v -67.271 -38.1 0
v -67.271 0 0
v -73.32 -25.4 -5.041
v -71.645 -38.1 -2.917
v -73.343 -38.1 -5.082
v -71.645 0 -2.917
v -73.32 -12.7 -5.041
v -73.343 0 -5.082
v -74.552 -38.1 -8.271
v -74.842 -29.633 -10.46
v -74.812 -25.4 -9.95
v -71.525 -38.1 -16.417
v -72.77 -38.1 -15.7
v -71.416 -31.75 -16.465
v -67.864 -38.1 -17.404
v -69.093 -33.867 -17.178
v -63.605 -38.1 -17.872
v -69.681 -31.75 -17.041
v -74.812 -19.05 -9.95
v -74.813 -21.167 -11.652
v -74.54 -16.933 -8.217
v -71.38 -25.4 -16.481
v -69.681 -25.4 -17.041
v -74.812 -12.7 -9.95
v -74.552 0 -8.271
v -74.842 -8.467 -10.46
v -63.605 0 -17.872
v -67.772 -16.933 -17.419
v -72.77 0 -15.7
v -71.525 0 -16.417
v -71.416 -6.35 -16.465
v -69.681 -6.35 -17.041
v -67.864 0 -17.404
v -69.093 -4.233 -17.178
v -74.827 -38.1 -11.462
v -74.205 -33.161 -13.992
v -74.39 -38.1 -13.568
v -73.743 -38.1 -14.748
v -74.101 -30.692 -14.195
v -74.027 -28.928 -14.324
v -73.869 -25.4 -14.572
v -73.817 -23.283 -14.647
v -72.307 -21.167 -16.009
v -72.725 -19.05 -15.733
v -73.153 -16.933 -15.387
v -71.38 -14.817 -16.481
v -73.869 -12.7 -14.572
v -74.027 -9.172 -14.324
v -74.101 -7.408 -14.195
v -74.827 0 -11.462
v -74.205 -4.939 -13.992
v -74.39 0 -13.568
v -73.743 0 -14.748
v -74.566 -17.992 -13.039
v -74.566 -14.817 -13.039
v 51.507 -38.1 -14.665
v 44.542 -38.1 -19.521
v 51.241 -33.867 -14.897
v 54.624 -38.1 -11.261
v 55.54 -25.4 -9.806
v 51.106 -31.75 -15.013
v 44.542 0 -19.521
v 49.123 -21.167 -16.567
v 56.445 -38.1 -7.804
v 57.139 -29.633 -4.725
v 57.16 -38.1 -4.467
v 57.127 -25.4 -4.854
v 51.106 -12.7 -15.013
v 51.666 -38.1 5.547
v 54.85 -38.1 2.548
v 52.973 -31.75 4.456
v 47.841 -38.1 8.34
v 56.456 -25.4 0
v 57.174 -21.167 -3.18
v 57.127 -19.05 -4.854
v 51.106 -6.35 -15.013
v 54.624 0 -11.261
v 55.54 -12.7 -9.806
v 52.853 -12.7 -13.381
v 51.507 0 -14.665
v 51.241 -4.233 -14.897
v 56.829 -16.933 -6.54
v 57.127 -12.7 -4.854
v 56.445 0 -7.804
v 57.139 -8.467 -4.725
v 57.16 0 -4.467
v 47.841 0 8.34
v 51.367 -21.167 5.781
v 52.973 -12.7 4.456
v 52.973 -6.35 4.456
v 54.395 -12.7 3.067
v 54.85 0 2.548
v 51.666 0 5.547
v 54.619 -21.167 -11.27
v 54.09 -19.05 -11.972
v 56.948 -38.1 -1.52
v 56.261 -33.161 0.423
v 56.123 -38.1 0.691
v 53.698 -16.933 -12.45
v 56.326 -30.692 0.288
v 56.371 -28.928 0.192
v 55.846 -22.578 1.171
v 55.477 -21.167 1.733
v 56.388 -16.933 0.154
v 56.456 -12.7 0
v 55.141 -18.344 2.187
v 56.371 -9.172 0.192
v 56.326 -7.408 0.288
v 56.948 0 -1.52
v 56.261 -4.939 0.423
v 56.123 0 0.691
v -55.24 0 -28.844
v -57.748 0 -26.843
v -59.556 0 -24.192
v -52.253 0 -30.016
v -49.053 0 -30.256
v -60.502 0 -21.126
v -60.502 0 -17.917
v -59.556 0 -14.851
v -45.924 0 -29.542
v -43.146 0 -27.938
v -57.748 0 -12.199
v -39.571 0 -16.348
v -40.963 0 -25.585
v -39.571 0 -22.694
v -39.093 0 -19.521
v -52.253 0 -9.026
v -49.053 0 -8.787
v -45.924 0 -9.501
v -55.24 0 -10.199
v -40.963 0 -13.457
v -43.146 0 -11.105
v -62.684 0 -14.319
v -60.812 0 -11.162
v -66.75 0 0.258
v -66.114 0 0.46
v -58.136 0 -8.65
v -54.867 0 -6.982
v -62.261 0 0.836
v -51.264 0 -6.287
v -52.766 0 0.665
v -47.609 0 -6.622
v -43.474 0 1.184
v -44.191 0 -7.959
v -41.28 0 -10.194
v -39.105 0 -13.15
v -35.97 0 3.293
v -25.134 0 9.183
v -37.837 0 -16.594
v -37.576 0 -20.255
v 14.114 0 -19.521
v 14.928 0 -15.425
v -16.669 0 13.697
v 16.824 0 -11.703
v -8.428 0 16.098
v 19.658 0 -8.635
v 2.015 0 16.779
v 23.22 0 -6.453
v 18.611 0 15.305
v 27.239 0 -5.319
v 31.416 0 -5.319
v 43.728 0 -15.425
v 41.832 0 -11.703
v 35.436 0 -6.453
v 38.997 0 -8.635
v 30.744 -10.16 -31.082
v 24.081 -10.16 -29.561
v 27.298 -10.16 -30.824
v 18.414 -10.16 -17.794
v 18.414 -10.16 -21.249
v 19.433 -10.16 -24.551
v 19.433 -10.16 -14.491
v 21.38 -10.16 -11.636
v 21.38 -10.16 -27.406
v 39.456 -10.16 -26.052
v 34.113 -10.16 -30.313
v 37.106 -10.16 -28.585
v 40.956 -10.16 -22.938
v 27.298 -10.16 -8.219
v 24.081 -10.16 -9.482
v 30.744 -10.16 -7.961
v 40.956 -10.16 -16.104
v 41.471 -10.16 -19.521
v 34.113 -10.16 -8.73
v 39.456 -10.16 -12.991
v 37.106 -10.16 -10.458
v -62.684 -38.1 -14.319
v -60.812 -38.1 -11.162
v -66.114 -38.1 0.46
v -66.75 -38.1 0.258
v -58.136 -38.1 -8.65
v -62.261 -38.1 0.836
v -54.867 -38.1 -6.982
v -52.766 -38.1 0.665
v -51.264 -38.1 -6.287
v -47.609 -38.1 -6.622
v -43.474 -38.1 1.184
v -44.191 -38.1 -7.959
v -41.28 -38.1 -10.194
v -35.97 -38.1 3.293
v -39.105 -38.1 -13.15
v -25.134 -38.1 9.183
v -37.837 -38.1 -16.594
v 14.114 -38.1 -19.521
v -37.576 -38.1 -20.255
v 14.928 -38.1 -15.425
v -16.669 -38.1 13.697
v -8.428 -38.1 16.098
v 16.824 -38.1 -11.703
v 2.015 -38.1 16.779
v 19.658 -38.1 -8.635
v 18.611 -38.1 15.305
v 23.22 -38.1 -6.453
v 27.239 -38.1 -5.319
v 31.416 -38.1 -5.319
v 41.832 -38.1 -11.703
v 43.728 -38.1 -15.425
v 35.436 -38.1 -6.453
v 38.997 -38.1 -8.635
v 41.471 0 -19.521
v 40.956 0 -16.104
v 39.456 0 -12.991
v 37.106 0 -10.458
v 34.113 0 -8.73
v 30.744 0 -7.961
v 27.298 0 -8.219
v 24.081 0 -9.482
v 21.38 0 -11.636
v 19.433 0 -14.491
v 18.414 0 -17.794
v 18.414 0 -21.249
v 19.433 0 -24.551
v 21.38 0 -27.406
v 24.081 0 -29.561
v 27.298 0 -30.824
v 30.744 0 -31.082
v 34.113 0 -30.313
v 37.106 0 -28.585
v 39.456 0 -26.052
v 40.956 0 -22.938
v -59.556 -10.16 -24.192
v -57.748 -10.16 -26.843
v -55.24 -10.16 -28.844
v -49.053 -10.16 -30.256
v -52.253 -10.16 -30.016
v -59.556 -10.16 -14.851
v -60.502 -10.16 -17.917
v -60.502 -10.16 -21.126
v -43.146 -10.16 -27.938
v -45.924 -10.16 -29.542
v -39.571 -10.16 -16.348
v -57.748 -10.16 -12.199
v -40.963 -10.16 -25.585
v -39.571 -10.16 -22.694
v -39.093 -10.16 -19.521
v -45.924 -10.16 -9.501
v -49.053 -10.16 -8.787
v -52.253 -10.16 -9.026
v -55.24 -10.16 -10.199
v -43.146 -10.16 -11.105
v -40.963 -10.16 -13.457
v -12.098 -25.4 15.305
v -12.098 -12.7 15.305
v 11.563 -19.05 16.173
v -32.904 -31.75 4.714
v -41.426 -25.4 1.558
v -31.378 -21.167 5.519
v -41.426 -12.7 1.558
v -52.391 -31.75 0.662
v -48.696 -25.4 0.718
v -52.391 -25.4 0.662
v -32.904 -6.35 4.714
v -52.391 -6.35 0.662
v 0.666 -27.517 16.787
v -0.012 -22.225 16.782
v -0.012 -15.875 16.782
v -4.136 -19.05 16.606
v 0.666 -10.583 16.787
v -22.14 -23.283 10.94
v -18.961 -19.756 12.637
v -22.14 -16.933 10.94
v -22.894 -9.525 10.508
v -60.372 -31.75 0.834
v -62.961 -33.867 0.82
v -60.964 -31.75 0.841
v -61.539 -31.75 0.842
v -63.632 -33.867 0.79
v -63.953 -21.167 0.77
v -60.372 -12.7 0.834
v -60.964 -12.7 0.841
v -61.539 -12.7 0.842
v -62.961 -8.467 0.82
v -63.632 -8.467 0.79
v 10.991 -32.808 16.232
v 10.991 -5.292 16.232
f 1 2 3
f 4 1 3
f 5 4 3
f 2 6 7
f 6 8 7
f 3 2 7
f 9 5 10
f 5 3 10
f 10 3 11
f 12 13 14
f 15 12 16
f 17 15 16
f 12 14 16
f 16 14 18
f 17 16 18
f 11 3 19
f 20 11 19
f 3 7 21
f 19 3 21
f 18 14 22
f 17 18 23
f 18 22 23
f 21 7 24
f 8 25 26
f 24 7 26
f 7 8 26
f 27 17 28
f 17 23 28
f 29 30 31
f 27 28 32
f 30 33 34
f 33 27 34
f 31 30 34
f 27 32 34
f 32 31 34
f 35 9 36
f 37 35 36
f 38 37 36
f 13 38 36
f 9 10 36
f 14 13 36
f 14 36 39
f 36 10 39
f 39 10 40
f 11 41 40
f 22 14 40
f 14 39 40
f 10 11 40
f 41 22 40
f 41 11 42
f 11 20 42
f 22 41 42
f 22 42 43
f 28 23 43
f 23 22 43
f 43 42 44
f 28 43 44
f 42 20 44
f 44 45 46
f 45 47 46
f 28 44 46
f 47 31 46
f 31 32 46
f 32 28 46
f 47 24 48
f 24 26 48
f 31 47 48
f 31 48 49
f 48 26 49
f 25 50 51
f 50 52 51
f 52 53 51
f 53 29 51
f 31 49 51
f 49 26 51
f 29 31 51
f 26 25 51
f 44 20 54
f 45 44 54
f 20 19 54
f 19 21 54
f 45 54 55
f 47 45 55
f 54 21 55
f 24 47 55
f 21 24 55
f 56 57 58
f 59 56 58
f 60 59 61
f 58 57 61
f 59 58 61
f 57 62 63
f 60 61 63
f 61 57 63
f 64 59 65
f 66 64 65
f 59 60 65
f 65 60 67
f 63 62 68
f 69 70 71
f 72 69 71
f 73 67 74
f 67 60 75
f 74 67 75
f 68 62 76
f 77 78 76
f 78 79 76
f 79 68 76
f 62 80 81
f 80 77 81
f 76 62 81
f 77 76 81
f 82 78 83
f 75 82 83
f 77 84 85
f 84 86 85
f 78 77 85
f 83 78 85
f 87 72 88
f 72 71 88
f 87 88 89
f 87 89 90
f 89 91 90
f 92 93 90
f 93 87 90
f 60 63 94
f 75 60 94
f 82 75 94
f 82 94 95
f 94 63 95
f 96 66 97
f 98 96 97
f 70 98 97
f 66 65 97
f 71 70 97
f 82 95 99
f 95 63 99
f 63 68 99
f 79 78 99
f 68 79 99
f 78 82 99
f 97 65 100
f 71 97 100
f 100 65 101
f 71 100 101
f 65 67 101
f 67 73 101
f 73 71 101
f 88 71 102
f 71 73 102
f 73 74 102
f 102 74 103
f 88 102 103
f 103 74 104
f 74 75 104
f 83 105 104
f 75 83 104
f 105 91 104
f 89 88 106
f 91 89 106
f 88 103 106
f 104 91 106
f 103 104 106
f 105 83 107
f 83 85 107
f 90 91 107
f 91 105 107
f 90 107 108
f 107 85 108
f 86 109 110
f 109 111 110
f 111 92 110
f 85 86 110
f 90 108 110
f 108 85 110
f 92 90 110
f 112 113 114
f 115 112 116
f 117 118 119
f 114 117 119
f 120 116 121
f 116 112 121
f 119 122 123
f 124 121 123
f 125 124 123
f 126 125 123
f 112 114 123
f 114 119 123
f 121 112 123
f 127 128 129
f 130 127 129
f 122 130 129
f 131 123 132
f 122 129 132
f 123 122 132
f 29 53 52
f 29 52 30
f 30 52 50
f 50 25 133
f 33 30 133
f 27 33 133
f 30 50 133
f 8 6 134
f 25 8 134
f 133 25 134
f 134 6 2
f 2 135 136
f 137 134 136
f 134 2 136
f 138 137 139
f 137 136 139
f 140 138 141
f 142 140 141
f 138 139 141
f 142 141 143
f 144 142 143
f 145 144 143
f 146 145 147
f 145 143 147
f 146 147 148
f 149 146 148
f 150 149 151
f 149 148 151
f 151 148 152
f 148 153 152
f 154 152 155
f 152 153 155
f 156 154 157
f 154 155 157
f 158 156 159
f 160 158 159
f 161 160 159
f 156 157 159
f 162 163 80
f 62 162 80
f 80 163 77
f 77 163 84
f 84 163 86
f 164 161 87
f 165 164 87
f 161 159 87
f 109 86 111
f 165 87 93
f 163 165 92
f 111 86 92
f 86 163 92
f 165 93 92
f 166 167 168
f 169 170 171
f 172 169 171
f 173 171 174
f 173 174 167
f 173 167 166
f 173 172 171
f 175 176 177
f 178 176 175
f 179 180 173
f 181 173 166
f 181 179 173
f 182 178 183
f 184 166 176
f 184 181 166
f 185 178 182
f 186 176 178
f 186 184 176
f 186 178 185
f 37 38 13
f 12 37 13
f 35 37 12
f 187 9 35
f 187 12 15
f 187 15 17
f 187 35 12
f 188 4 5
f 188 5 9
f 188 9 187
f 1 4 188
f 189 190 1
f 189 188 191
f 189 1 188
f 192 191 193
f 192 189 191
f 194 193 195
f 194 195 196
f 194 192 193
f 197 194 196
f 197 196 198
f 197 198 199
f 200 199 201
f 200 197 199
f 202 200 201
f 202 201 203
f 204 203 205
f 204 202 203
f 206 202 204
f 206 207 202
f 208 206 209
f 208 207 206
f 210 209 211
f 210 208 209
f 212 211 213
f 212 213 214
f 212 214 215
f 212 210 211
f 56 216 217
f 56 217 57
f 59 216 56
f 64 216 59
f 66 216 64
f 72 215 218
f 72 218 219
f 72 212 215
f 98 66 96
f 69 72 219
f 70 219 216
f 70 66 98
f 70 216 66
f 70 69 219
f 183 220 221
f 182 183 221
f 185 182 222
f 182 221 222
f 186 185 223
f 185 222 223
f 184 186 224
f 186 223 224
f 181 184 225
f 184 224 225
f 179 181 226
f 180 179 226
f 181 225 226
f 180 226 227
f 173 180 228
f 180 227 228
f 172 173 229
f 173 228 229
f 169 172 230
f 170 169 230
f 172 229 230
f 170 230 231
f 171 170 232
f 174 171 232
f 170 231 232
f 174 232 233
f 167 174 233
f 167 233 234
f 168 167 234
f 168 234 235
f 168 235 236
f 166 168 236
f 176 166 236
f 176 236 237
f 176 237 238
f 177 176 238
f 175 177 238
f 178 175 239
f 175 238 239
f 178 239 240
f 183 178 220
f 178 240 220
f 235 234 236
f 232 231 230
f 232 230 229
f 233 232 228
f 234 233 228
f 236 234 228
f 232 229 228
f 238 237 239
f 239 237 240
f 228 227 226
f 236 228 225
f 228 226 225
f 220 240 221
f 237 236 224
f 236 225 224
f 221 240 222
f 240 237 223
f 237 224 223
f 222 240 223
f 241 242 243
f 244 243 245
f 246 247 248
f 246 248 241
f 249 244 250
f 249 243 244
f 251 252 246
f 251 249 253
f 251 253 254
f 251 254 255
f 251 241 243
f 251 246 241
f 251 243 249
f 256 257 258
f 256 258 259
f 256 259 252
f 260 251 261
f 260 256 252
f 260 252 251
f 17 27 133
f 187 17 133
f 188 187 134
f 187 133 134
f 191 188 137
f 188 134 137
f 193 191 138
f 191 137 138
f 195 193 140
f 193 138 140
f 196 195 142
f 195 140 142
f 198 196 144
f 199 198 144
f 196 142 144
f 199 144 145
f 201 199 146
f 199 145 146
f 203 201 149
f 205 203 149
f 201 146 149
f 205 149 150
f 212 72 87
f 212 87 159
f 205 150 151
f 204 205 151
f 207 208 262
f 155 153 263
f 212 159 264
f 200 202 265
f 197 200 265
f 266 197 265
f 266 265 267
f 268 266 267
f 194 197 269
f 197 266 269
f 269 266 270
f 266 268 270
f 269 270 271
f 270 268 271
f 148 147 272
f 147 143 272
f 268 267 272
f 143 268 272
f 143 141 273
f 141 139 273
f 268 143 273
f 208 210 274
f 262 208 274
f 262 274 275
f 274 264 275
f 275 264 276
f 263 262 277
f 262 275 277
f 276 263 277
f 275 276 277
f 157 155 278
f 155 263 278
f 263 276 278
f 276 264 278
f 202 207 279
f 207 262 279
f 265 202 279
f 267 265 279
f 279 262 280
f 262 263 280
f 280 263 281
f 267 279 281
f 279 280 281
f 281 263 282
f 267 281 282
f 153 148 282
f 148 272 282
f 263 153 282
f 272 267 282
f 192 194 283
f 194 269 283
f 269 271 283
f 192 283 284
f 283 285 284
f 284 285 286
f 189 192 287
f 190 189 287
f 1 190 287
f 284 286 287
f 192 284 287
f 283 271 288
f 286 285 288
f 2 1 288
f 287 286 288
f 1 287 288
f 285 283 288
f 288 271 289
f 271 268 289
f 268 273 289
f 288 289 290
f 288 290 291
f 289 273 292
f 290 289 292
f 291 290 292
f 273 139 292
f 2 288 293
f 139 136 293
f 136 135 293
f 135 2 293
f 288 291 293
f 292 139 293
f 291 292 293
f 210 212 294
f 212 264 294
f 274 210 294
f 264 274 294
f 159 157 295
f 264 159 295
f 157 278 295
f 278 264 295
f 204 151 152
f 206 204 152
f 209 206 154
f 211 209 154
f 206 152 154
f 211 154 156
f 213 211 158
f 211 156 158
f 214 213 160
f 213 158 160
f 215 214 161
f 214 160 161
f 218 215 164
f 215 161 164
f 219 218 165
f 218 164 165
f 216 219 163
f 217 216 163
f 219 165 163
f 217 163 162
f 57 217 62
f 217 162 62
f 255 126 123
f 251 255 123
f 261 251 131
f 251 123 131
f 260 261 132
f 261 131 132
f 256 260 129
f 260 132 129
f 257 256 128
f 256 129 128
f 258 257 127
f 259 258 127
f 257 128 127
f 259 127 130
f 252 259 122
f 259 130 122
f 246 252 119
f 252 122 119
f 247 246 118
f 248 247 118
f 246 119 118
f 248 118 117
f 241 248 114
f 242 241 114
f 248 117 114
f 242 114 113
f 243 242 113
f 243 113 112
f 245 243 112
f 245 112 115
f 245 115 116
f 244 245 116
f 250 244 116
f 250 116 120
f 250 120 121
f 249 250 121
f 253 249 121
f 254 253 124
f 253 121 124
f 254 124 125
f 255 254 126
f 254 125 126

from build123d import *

# Parameters (mm, degrees)
F0_R     = 10.7648143955
F1_DEPTH = 10.16
F0_R_2   = 11.5928463858
F3_DEPTH = 38.1


with BuildPart() as f1:
    # F0 (on Front) → F1 (new body)
    with BuildSketch(Plane.XZ):
        with Locations((-49.8573184013, -19.5213407278)):
            Circle(F0_R)
    extrude(amount=F1_DEPTH)


with BuildPart() as f1b:
    # F0 (on Front) → F1, piece 2 (new body)
    with BuildSketch(Plane.XZ):
        with Locations((29.8777315766, -19.5213407278)):
            Circle(F0_R_2)
    extrude(amount=F1_DEPTH)


with BuildPart() as f3:
    # F2 (on Front) → F3 (new body)
    with BuildSketch(Plane.XZ):
        with BuildLine():
            ThreePointArc((14.1140213236, -19.5213407278), (29.327835422, -5.1748885976), (44.5416495204, -19.5213407278))
            add(Edge.make_bspline(
                [(44.5416495204, -19.5213407278), (49.4861837134, -16.6310779415), (56.6740007358, -11.1655072143), (58.2753974305, 1.0585842235), (51.4601339264, 5.792301038), (47.8410348296, 8.3401026204)],
                knots=[0, 0, 0, 0, 0.3672132723, 0.6680576414, 1, 1, 1, 1], degree=3))
            Line((47.8410348296, 8.3401026204), (18.6113944658, 15.305464156))
            add(Edge.make_bspline(
                [(18.6113944658, 15.305464156), (12.7238584134, 16.0597433895), (-15.9157623646, 20.4472537814), (-37.0131828329, -3.5251980606), (-63.981585704, 2.0544994679), (-67.2707185149, 0)],
                knots=[0, 0, 0, 0, 0.339532105, 0.6882327384, 1, 1, 1, 1], degree=3))
            add(Edge.make_bspline(
                [(-67.2707185149, 0), (-69.5667038523, -1.2541929166), (-74.3909251258, -3.8894467448), (-76.1343603524, -16.7777810793), (-67.8650563977, -17.4997132256), (-63.6047422886, -17.8716499358)],
                knots=[0, 0, 0, 0, 0.3056849659, 0.6422915215, 1, 1, 1, 1], degree=3))
            ThreePointArc((-63.6047422886, -17.8716499358), (-49.4243825032, -6.325330981), (-37.5762879848, -20.2545356005))
            Line((-37.5762879848, -20.2545356005), (14.1140213236, -19.5213407278))
        make_face()
    extrude(amount=F3_DEPTH)


solid = Compound([f1.part, f1b.part, f3.part])
